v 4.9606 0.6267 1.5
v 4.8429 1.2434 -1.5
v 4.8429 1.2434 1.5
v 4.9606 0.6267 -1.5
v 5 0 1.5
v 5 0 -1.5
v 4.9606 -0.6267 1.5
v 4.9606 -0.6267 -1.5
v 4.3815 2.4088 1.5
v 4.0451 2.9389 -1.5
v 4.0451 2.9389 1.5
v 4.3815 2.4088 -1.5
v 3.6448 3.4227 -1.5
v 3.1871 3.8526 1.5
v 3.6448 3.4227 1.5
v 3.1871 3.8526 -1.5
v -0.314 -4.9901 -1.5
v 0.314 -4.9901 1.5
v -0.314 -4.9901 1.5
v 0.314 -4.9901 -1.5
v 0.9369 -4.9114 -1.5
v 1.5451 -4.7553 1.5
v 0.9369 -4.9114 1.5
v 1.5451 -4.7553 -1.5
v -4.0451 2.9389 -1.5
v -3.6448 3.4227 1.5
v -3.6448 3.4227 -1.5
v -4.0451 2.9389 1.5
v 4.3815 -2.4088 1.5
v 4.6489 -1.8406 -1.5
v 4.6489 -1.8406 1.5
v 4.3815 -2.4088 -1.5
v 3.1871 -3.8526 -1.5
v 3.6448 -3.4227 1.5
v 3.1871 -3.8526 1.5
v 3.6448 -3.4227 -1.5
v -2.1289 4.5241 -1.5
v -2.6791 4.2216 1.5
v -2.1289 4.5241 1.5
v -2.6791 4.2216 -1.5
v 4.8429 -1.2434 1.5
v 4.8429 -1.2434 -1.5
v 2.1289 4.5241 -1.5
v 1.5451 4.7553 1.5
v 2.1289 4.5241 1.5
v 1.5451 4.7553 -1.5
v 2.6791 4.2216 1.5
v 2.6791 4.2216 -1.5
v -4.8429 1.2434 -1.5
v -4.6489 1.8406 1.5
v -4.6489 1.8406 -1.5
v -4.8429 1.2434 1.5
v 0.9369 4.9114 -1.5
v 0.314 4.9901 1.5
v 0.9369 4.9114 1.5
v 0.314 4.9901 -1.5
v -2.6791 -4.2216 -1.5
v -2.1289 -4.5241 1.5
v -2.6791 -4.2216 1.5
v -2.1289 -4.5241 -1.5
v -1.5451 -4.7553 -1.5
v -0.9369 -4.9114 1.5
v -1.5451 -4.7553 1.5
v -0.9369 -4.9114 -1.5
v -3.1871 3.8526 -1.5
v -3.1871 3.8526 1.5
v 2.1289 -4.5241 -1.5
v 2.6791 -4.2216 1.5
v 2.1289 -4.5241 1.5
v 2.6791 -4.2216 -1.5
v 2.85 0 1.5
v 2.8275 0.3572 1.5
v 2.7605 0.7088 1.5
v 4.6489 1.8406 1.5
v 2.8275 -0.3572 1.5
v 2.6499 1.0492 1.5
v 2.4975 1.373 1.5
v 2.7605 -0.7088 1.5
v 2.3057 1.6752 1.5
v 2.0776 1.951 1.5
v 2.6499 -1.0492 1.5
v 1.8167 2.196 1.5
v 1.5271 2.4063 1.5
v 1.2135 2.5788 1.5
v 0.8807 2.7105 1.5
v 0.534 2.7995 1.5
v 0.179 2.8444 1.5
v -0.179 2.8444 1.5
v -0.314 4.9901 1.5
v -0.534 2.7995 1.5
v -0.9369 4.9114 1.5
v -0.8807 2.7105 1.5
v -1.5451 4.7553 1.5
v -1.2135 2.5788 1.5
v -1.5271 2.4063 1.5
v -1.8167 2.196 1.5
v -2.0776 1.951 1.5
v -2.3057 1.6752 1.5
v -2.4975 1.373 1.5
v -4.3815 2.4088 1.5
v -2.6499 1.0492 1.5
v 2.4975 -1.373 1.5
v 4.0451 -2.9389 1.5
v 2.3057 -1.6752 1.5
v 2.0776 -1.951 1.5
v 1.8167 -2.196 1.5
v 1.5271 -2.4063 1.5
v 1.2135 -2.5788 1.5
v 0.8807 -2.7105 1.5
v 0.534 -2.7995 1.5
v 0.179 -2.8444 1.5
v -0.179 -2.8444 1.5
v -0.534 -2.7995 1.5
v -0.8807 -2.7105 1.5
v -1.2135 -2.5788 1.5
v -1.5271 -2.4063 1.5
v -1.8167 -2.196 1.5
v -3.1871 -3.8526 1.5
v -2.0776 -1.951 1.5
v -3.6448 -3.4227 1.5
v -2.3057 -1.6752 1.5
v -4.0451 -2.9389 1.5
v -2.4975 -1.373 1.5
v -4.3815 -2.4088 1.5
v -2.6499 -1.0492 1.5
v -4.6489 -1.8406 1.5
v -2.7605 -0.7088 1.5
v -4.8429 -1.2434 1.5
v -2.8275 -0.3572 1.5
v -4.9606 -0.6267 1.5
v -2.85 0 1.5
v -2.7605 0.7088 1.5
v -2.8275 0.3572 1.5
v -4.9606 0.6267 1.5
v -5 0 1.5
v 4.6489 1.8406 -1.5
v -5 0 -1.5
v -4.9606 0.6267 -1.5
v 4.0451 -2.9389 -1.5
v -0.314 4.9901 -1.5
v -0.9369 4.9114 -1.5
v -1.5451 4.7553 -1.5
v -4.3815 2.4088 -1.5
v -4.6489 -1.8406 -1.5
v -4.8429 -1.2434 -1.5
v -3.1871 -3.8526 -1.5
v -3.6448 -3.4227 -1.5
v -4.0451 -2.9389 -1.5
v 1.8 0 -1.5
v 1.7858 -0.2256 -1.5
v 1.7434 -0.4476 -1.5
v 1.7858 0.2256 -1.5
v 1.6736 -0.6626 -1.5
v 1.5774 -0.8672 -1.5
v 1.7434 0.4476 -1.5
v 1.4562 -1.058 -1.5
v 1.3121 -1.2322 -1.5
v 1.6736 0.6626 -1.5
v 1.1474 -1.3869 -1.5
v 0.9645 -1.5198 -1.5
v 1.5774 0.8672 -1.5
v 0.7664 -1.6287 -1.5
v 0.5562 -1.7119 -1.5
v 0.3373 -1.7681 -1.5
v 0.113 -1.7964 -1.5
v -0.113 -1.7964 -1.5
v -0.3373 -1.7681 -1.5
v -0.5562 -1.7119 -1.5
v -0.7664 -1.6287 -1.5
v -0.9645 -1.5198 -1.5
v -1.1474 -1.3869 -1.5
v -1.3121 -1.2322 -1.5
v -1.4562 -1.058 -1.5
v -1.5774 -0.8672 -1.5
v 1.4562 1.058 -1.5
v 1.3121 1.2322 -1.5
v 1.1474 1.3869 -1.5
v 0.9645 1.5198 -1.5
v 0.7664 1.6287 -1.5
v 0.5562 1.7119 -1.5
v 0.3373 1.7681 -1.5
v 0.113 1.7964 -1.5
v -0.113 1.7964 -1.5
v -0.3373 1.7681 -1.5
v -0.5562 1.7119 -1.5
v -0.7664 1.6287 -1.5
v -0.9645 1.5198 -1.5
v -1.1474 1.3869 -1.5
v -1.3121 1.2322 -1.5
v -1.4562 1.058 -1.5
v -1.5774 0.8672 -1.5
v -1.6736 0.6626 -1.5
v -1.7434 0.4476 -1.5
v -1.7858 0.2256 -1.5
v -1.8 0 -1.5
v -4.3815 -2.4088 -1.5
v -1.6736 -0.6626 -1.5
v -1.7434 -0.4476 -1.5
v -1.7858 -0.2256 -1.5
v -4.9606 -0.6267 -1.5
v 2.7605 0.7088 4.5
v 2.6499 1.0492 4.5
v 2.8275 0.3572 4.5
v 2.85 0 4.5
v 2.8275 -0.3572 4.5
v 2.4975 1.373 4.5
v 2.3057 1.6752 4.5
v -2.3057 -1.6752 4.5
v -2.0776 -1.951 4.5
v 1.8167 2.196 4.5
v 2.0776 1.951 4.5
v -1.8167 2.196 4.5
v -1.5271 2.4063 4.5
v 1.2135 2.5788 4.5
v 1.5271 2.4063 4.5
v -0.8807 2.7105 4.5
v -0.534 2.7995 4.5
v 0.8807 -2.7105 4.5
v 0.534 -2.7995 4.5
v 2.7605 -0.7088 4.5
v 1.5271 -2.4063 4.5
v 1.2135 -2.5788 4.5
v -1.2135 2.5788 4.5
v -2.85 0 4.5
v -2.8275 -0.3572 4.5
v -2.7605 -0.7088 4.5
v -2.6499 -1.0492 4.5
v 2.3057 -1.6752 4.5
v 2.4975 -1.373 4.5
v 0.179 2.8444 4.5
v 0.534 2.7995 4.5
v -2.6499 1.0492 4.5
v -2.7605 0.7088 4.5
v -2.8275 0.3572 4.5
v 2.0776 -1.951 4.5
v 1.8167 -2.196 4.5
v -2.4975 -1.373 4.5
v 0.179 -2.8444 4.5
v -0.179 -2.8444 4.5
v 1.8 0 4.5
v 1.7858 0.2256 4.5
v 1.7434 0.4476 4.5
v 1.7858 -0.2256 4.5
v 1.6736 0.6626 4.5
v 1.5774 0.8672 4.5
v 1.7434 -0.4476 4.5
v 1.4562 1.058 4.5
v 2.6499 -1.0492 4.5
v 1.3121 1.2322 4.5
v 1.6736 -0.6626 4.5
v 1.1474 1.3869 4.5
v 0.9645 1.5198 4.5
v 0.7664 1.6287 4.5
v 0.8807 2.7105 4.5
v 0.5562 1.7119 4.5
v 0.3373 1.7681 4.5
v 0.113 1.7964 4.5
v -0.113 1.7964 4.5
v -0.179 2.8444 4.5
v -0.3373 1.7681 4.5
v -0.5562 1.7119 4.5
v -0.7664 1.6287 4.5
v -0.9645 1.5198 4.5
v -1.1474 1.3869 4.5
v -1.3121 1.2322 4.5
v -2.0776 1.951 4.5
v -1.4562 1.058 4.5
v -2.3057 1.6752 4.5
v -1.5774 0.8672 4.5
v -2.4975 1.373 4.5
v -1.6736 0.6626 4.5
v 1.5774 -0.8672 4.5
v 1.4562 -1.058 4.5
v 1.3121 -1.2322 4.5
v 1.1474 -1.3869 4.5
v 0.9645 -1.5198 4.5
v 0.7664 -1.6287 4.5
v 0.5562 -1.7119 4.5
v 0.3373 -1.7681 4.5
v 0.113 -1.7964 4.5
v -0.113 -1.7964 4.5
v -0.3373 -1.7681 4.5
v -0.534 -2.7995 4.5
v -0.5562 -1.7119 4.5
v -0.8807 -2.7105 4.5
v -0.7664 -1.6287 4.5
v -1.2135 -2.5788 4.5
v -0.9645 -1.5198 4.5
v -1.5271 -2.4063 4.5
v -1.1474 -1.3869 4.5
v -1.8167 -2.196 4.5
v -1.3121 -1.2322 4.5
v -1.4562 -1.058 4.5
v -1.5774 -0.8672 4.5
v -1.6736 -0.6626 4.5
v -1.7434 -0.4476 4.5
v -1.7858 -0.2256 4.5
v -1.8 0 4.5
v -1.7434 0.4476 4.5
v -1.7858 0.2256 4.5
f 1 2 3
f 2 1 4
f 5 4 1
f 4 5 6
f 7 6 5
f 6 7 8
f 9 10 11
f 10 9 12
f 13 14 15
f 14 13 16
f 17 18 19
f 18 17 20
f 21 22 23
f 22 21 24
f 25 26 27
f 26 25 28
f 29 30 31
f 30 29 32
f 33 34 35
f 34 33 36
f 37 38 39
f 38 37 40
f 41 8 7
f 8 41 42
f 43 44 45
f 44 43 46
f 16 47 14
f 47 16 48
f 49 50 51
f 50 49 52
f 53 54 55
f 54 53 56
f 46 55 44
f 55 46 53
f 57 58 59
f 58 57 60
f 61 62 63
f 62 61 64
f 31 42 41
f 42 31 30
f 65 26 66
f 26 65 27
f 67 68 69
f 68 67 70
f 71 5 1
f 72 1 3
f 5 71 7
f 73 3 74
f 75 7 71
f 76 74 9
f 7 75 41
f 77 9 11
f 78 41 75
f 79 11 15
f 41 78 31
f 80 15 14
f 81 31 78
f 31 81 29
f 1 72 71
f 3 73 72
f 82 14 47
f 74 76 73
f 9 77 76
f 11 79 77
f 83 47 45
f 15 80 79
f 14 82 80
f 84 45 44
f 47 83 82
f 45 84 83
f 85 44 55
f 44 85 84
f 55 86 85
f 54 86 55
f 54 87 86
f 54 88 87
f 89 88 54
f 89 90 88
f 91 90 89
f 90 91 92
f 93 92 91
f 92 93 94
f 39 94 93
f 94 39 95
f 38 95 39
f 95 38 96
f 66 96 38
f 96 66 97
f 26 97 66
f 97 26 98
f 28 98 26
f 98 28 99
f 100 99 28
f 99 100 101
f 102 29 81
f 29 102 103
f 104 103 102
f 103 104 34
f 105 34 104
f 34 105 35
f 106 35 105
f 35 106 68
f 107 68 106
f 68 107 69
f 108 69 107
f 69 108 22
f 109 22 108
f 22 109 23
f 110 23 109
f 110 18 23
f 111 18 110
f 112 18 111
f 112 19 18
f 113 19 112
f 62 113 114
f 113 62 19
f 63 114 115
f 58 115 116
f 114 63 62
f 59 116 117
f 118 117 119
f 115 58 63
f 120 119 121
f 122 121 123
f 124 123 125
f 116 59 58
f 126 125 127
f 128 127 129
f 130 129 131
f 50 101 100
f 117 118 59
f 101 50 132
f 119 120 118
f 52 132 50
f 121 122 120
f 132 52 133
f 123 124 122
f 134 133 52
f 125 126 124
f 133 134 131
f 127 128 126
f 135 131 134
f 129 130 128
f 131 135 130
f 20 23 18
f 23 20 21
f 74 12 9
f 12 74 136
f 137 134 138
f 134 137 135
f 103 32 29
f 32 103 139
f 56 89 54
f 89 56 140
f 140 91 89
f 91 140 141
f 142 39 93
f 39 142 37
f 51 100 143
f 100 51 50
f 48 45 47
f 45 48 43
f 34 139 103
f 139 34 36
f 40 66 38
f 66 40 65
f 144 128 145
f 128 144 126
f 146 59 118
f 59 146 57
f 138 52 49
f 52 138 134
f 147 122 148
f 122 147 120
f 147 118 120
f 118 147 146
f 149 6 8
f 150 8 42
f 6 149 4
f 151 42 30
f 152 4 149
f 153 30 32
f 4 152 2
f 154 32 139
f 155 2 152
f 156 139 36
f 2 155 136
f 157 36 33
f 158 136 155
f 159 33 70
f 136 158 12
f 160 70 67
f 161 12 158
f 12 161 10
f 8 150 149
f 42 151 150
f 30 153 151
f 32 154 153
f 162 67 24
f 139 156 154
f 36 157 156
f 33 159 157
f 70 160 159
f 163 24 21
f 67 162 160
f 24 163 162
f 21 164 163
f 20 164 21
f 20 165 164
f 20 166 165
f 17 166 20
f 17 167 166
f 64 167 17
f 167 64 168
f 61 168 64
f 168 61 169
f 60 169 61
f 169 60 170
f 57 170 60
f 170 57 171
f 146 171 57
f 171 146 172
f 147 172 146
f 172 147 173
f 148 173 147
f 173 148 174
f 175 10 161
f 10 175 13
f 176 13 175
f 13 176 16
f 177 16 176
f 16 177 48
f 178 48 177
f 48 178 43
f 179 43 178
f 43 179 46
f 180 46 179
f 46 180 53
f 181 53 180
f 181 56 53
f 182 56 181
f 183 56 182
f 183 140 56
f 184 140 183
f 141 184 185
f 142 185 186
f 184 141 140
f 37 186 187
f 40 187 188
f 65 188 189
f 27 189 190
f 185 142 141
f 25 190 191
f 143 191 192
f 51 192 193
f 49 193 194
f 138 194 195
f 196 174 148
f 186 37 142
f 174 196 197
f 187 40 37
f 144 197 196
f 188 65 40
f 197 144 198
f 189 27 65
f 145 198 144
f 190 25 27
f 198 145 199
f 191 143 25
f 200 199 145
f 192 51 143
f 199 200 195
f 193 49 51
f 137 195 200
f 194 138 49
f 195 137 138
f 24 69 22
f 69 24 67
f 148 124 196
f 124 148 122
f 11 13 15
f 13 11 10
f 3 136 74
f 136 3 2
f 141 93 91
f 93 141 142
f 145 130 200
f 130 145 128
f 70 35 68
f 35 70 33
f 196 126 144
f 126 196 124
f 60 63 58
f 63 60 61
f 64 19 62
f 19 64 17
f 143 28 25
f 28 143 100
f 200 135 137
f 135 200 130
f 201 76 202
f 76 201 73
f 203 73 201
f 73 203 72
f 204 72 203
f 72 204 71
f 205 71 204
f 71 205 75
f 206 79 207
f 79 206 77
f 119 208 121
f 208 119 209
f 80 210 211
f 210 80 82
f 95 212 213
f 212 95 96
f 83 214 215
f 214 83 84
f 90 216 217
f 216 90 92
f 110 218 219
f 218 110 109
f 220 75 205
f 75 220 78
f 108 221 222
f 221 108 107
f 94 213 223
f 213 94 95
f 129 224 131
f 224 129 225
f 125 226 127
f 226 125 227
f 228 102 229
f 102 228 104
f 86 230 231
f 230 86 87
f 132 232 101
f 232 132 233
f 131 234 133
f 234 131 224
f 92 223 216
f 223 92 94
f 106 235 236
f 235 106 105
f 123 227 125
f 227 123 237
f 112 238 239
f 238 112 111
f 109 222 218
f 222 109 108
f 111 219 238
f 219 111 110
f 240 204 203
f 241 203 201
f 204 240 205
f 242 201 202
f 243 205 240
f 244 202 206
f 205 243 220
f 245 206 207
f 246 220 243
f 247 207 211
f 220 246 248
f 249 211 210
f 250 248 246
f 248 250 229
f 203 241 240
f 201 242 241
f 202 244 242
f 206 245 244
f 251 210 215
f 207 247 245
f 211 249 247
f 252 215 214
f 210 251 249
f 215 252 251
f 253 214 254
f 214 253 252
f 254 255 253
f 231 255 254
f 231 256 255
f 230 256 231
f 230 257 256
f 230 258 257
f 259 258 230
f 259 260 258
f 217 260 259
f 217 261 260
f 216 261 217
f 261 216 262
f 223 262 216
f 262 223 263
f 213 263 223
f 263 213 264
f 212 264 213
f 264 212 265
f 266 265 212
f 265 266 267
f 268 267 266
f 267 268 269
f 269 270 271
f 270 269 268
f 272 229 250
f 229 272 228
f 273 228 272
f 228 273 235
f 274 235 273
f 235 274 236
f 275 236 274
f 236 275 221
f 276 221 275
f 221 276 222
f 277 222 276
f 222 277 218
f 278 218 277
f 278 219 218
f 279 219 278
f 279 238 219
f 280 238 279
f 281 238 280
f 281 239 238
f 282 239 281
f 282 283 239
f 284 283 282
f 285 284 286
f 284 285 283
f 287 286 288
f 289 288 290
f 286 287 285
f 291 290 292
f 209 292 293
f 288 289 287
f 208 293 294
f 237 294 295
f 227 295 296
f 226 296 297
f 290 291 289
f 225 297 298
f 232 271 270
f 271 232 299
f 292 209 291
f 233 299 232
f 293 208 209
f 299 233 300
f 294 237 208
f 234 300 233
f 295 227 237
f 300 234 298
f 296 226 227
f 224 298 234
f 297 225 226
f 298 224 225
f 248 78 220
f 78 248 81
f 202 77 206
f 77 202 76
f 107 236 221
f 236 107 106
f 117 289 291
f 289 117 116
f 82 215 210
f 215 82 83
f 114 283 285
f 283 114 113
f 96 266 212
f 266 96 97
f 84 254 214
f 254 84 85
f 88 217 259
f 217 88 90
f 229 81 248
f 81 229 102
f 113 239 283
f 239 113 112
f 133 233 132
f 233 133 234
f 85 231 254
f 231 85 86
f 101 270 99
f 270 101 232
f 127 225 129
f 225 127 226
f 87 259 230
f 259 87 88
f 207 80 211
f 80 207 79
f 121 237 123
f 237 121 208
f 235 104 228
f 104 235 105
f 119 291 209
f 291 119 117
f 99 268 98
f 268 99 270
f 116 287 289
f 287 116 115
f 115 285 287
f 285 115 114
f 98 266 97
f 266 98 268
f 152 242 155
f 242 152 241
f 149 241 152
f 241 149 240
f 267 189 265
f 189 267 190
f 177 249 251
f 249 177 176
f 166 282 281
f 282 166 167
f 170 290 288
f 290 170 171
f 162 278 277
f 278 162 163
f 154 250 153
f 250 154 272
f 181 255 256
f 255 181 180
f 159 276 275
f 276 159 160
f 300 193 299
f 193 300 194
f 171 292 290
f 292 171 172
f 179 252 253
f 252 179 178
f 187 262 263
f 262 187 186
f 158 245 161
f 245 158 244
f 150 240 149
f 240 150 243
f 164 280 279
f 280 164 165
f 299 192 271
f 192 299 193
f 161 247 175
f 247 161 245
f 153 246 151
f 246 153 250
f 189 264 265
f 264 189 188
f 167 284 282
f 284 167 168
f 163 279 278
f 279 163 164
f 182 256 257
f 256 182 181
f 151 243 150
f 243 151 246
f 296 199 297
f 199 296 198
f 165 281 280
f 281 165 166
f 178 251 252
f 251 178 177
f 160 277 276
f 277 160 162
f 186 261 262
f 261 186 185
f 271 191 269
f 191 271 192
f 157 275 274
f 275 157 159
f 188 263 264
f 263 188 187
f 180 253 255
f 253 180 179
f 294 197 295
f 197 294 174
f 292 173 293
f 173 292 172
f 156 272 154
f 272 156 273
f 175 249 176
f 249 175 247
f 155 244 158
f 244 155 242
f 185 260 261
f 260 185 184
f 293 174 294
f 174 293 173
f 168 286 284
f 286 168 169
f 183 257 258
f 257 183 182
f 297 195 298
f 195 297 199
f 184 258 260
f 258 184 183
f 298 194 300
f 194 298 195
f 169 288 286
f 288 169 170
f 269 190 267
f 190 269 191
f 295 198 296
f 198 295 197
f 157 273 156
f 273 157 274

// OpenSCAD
$fn = 50;


difference() {
	union() {
		translate(v = [0, 0, -1.5000000000]) {
			cylinder(h = 3, r = 5.0000000000);
		}
		translate(v = [0, 0, -1.5000000000]) {
			cylinder(h = 6, r = 2.8500000000);
		}
	}
	union() {
		translate(v = [0, 0, -50.0000000000]) {
			cylinder(h = 100, r = 1.8000000000);
		}
	}
}
